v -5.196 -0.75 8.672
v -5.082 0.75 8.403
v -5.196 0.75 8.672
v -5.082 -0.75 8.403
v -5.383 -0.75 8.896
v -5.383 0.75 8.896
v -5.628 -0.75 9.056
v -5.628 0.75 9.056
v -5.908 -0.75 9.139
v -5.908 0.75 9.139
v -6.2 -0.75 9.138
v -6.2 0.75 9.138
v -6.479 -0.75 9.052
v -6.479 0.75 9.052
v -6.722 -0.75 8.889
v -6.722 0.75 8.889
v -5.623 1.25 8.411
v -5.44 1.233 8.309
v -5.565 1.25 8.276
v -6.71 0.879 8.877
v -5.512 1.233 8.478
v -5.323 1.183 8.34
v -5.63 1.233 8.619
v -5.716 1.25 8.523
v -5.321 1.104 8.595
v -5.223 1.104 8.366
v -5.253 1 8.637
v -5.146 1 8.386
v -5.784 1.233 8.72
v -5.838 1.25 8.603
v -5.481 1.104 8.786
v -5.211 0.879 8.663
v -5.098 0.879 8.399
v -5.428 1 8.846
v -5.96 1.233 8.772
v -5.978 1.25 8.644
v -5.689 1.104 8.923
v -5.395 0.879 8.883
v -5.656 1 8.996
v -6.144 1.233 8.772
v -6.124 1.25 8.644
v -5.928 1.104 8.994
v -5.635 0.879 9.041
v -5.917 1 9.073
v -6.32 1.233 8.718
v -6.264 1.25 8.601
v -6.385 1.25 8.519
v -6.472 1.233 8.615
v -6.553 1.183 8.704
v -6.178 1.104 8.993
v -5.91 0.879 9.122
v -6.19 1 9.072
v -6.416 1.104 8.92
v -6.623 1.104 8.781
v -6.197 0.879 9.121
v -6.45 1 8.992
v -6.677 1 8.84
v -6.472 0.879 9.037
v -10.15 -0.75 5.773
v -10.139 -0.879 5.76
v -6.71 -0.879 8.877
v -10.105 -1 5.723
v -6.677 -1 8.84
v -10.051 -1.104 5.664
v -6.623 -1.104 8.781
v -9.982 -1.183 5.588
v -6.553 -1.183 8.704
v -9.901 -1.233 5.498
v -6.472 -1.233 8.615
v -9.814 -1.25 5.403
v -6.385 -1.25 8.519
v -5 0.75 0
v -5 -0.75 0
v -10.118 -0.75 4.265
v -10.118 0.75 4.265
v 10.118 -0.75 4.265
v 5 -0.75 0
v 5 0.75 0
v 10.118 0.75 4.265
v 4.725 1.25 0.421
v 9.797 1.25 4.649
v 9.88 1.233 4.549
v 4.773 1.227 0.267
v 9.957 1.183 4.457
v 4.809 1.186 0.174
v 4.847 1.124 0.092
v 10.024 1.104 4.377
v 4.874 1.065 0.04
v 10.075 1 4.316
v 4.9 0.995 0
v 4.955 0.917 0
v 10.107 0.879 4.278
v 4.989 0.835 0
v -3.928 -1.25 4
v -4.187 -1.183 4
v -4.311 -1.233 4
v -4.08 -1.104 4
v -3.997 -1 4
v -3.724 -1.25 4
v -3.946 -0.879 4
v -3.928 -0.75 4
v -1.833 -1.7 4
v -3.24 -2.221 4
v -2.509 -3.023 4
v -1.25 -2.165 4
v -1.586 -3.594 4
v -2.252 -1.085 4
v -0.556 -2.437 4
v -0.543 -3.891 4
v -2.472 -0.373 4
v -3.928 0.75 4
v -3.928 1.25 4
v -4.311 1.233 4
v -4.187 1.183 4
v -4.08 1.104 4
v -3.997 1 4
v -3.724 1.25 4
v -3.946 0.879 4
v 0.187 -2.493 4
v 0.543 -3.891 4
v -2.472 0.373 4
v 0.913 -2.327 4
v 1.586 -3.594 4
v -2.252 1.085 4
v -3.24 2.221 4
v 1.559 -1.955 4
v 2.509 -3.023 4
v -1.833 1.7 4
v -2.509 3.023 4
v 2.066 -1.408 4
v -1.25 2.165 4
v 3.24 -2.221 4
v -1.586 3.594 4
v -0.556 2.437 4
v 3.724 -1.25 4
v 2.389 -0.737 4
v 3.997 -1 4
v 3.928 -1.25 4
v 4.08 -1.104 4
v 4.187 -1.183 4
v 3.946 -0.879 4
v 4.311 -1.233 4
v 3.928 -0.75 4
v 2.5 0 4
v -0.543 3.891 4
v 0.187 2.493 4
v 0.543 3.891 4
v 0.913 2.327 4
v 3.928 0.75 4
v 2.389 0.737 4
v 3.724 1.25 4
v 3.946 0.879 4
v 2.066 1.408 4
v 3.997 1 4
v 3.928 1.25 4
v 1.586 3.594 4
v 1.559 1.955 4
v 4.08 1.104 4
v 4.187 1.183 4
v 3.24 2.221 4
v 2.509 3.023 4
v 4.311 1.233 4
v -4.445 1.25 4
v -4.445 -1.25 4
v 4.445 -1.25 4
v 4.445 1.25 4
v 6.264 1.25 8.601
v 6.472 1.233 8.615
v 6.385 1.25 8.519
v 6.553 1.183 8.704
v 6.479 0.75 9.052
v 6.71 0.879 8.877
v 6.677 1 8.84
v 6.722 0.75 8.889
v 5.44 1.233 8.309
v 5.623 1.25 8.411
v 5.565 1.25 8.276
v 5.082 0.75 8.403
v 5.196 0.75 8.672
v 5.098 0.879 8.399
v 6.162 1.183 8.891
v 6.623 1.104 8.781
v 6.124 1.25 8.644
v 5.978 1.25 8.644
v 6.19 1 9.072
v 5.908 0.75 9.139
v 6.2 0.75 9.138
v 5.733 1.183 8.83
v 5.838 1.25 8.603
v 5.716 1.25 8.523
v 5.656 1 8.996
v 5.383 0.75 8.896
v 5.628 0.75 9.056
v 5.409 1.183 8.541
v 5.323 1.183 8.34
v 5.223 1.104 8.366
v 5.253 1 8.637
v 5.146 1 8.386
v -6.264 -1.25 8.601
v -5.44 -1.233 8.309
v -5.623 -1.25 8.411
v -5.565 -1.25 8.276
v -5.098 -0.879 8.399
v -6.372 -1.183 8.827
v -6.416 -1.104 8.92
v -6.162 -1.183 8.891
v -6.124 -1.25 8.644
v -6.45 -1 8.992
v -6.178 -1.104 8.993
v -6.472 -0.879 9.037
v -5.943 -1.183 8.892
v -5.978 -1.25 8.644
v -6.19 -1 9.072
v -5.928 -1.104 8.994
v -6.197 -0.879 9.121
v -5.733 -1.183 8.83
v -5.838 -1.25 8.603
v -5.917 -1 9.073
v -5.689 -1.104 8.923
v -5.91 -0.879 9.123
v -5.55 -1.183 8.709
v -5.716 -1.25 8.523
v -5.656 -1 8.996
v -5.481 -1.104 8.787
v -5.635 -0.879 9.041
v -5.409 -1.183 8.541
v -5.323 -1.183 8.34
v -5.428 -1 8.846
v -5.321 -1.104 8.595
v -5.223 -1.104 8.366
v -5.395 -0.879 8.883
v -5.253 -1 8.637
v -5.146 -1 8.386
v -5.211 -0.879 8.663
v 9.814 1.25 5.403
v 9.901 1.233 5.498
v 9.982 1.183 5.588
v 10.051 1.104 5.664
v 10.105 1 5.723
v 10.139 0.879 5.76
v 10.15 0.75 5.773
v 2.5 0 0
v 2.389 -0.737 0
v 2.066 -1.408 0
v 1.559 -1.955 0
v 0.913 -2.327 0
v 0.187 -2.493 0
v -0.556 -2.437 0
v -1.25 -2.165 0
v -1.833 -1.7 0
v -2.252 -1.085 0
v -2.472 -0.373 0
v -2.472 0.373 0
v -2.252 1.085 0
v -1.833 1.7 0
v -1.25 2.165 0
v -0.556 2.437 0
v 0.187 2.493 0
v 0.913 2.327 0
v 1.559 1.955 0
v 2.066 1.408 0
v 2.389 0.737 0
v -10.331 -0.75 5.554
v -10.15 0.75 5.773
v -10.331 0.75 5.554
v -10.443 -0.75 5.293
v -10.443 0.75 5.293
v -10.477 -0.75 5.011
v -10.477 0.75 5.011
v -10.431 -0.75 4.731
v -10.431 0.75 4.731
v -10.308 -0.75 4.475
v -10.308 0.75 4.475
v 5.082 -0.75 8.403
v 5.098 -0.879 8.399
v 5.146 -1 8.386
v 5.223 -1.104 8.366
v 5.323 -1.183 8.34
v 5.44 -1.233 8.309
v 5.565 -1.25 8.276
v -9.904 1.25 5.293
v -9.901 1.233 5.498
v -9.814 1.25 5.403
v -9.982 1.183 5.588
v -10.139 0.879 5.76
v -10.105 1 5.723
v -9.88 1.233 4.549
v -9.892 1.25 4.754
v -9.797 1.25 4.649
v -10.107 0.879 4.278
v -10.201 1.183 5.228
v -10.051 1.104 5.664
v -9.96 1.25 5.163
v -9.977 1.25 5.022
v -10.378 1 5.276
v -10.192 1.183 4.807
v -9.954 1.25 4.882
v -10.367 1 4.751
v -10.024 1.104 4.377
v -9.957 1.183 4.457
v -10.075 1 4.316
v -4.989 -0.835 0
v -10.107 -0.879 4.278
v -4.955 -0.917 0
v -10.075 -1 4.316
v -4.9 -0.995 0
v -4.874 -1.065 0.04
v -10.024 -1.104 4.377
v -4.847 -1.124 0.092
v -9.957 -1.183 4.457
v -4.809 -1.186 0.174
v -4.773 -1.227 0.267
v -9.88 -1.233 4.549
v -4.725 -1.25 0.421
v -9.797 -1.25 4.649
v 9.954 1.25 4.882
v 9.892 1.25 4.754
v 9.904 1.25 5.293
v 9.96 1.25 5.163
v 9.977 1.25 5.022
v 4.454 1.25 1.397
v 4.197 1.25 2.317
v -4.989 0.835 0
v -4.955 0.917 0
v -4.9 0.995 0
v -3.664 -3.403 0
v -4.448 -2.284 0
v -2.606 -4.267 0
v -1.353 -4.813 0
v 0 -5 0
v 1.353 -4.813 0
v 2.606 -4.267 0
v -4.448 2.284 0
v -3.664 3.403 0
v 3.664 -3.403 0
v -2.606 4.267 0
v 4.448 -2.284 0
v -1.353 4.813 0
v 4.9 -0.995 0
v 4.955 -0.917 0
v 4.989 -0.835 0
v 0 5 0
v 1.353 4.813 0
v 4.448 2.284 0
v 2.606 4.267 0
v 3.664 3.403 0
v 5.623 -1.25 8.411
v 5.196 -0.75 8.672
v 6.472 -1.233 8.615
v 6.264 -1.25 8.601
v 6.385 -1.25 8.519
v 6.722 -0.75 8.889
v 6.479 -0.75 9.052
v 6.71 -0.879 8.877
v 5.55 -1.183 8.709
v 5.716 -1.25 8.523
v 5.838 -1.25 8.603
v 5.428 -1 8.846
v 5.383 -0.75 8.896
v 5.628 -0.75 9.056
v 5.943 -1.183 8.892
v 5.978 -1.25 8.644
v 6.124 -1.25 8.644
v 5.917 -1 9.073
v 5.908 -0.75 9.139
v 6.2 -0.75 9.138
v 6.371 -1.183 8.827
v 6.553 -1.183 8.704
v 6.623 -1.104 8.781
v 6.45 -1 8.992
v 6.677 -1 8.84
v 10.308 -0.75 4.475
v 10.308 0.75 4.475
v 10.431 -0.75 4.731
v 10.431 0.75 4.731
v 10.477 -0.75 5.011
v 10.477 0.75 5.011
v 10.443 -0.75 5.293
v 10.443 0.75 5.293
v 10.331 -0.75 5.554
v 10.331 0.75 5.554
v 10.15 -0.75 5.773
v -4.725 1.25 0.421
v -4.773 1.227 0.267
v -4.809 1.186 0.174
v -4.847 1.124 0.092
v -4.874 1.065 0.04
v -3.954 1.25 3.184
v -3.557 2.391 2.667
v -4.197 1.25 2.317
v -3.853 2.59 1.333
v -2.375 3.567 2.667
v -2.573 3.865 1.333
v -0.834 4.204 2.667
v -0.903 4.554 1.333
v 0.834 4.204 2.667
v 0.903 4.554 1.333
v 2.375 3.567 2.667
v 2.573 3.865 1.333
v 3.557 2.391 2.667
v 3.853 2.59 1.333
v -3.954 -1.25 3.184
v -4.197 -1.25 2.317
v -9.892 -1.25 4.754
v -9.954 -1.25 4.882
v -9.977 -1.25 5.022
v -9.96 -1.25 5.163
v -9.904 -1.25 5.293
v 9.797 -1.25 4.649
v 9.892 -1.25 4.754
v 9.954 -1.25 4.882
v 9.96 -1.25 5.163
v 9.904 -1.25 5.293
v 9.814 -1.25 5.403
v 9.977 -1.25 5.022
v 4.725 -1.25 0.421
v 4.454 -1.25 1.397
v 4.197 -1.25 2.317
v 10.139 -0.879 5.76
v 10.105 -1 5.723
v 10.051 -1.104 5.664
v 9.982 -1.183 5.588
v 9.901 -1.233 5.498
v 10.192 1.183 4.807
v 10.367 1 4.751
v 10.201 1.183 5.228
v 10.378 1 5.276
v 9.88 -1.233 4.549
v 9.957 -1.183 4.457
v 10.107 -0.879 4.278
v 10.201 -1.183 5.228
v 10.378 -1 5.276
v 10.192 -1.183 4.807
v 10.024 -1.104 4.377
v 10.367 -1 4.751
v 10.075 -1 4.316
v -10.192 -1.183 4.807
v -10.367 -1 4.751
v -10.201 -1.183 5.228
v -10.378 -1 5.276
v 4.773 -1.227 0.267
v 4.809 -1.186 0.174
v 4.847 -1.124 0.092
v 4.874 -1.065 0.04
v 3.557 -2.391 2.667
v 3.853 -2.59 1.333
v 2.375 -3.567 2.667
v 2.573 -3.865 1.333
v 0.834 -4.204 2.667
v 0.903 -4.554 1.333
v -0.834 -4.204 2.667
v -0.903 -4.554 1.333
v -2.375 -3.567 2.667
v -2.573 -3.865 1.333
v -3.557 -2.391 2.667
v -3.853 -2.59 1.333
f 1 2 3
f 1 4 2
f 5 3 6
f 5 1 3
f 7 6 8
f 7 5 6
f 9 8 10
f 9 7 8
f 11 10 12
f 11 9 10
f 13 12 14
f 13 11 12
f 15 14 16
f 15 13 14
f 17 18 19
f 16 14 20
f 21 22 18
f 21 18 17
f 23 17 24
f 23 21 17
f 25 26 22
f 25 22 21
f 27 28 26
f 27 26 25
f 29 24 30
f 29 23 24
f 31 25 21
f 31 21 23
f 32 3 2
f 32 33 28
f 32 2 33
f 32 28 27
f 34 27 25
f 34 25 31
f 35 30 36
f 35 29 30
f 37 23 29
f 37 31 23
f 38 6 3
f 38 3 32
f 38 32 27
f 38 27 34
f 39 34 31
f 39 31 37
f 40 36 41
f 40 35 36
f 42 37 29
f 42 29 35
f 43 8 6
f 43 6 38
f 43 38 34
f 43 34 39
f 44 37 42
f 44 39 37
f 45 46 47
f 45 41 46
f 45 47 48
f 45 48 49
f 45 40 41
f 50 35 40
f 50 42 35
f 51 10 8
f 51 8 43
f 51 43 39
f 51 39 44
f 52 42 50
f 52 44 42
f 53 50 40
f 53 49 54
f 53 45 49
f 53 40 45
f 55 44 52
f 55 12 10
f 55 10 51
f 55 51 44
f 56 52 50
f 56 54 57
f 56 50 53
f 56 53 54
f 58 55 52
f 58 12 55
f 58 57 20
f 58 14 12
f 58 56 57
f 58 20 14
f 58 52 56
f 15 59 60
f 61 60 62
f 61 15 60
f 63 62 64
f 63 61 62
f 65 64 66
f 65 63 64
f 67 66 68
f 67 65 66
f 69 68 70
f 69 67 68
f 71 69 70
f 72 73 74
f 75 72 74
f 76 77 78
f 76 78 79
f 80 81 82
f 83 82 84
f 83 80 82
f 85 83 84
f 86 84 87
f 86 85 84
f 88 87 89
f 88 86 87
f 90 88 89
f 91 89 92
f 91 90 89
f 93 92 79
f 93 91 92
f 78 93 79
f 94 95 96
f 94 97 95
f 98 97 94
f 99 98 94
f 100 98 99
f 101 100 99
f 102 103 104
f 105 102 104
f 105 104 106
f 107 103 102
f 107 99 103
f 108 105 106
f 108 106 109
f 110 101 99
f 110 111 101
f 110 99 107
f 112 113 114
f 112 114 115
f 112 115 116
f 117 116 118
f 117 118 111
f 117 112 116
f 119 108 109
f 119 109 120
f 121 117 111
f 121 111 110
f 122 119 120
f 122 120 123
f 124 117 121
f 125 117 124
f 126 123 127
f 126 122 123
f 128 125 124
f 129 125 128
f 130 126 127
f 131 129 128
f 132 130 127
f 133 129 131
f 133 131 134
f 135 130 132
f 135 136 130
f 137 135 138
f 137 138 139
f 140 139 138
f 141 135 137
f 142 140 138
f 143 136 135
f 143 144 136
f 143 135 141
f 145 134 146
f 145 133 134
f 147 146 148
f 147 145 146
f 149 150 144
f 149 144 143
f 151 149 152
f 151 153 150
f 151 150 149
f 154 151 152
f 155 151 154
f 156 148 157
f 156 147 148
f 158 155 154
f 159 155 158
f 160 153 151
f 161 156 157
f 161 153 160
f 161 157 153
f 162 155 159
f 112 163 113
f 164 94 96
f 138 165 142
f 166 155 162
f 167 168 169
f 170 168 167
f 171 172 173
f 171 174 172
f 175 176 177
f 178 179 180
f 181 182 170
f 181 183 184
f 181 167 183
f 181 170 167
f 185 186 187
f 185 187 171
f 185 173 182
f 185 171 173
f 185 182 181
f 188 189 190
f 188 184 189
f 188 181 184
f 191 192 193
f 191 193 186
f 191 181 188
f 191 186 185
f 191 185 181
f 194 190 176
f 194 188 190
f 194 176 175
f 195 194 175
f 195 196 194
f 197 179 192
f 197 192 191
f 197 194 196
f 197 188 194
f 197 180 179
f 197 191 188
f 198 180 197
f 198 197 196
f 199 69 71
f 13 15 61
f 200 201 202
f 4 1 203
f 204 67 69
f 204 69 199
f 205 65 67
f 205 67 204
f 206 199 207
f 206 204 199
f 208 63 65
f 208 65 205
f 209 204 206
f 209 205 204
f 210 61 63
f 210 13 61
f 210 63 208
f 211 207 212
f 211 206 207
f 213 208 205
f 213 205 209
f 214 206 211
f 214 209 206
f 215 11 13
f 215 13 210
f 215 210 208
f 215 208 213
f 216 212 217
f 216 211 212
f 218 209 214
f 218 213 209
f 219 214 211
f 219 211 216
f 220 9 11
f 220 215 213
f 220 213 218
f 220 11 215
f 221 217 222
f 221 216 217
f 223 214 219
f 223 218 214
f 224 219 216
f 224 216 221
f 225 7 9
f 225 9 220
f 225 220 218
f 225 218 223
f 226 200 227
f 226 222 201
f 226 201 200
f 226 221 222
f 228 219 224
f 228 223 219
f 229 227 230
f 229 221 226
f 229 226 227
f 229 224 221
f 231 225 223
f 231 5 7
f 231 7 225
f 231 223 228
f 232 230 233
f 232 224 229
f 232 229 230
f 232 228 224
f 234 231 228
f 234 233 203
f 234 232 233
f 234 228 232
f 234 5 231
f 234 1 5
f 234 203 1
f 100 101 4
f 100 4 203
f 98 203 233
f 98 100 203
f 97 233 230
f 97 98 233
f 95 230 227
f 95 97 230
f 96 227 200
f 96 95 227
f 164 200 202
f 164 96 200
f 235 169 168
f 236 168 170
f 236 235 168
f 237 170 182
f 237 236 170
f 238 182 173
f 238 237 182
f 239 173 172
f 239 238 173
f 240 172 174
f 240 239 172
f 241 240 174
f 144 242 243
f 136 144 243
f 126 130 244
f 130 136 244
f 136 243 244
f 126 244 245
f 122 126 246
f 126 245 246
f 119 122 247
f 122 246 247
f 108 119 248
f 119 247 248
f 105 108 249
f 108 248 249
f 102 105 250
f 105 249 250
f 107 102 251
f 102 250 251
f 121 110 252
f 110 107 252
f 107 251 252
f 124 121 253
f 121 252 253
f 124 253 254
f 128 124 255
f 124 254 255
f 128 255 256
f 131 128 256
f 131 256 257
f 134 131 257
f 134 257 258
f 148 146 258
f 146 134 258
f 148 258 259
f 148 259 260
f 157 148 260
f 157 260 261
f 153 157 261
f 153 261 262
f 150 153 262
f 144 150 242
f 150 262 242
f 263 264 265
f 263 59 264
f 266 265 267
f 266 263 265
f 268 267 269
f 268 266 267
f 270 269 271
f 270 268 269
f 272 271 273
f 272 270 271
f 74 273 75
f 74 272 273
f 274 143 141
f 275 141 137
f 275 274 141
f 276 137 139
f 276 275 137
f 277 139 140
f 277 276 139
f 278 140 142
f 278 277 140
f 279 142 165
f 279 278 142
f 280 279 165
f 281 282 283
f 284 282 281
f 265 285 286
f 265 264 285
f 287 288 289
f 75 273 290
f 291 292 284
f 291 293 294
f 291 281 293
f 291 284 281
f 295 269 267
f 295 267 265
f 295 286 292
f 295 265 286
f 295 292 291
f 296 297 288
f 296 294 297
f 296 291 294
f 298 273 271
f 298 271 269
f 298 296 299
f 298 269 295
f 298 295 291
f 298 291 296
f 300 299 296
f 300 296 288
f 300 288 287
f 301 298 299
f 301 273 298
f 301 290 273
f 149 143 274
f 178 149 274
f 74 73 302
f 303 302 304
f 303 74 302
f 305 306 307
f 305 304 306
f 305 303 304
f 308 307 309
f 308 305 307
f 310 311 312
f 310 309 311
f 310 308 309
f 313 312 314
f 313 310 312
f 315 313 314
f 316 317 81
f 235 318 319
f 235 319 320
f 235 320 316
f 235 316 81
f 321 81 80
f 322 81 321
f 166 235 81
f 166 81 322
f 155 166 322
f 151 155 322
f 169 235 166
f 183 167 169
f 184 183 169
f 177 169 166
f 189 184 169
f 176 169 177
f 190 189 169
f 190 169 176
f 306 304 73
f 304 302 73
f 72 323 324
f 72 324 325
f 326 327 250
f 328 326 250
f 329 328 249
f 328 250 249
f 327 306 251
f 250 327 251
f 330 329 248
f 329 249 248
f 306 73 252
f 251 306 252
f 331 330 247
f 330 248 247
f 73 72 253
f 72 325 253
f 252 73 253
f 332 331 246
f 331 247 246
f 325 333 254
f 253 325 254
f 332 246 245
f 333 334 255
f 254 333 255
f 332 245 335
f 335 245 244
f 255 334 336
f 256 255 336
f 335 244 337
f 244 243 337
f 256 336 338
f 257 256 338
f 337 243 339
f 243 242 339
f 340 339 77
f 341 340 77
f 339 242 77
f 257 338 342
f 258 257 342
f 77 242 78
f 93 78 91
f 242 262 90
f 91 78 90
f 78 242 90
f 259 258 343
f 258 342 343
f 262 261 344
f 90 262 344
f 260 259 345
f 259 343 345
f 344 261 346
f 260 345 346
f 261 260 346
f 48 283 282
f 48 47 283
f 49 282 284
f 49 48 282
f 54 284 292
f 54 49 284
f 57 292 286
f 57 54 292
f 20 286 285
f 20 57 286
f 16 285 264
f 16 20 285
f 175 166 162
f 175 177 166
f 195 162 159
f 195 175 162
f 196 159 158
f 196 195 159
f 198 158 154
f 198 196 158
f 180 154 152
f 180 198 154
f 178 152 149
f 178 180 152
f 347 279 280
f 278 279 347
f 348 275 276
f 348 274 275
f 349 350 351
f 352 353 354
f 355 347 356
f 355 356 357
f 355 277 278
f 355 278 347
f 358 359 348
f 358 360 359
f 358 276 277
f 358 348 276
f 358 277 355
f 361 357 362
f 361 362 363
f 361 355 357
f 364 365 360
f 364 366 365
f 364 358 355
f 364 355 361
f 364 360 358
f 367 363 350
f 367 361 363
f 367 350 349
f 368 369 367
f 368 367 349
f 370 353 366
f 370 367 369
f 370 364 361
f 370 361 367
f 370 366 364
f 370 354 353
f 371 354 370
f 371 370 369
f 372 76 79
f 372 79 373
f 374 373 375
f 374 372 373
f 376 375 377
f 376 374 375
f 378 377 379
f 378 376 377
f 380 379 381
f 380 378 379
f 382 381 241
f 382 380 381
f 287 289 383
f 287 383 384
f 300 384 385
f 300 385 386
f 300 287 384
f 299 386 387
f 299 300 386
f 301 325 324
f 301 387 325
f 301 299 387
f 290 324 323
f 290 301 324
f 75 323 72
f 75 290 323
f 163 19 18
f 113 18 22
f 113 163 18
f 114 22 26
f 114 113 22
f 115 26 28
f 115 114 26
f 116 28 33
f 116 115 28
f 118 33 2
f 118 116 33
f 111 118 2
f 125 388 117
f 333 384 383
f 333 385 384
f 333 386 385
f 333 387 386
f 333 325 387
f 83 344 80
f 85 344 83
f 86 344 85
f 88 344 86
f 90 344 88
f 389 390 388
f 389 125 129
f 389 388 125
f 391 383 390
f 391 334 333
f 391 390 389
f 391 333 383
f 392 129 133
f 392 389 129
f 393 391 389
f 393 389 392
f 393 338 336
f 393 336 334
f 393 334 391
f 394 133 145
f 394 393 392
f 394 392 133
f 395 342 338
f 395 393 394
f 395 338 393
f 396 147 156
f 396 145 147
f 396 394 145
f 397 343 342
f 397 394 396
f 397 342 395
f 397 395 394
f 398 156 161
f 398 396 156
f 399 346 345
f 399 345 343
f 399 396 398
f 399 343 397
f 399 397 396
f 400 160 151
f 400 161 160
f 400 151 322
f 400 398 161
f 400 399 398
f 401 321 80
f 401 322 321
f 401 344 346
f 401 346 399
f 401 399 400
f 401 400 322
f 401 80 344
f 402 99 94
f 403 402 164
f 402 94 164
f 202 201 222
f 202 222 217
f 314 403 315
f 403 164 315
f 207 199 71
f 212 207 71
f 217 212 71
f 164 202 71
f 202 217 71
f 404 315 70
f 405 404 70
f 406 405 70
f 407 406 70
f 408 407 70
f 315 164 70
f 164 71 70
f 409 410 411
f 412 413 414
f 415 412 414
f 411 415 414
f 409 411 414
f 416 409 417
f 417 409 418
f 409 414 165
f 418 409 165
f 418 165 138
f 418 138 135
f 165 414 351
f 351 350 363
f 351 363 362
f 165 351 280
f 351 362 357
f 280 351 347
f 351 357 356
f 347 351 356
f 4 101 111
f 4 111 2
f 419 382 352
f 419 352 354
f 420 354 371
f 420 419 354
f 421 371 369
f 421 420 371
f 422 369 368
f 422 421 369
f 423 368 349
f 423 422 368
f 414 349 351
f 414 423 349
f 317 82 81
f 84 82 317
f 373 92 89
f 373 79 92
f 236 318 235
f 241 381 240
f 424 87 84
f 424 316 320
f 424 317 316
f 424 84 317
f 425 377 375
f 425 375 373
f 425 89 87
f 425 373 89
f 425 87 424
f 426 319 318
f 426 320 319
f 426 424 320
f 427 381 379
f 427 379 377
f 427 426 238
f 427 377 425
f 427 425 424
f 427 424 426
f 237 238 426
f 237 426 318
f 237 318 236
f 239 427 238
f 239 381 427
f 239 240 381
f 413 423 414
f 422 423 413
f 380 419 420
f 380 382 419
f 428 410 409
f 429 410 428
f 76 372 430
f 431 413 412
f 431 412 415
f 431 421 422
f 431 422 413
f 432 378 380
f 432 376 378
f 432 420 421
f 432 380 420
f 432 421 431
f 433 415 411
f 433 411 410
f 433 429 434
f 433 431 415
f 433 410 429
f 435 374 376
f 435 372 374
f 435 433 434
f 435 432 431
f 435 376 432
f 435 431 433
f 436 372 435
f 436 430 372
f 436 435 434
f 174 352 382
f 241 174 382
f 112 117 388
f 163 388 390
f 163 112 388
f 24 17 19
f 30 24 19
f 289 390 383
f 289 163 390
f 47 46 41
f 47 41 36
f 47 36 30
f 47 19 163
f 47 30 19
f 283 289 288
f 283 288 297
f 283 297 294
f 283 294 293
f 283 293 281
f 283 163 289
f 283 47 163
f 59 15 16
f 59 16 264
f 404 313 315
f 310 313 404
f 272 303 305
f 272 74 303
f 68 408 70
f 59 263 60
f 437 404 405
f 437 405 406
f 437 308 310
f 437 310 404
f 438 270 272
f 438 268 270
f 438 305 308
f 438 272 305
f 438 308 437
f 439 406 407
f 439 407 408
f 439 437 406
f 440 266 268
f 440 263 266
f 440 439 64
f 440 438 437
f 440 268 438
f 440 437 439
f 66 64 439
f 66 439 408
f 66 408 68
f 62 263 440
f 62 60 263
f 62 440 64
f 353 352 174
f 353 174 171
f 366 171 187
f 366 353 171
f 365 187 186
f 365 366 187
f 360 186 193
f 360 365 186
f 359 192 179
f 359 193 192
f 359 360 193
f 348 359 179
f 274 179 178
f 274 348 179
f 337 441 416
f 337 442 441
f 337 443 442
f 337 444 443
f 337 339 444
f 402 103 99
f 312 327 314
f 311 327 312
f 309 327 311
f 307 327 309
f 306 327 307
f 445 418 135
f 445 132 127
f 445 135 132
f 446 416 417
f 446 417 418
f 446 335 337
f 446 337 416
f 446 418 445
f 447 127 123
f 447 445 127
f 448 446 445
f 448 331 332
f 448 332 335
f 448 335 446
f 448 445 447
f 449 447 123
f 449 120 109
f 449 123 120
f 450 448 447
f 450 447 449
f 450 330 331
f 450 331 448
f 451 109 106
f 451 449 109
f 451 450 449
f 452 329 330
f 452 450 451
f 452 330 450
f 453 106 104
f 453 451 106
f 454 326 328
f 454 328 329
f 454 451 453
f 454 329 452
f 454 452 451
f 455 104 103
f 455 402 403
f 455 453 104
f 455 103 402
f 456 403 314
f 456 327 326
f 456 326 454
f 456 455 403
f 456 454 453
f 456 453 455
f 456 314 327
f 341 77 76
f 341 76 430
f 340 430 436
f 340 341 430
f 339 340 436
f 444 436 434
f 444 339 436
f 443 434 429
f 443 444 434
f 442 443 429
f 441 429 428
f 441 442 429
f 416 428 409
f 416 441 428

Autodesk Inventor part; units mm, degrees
ref_plane "YZ Plane" through (0, 0, 0) normal (1, 0, 0) x (0, 1, 0)
ref_plane "XZ Plane" through (0, 0, 0) normal (0, 1, 0) x (-1, 0, 0)
ref_plane "XY Plane" through (0, 0, 0) normal (0, 0, 1) x (1, 0, 0)
sketch "Эскиз1" plane through (0, 0, 0) normal (0, 1, 0) x (-1, 0, 0)
  line L0 (-2.5, 4) -> (-2.5, 0)
  line L1 (-5, 0) -> (-2.5, 0)
  line L2 (-5, 0) -> (-3.9282, 4)
  line L3 (-2.5, 4) -> (-3.9282, 4)
  line L4 (0, 0) -> (0, 7.6417) construction
revolve "Вращение1" add sketch "Эскиз1" angle 360 about axis through (0, 0, 0) along (0, 0, 1)
sketch "Эскиз2" plane through (0, 0, 0) normal (0, 1, 0) x (-1, 0, 0)
  line L0 (-6.7216, 8.8894) -> (-10.15, 5.7727)
  line L1 (-5, 0) -> (-10.1175, 4.2646)
  line L2 (-3.9282, 4) -> (-5.0816, 8.4029)
  arc A0 (-5.0816, 8.4029) -> (-6.7216, 8.8894) centre (-6.049, 8.1495) ccw
  arc A1 (-10.15, 5.7727) -> (-10.1175, 4.2646) centre (-9.4773, 5.0328) ccw
  line L3 (0, 0) -> (0, 6.5882) construction
  line L4 (6.7216, 8.8894) -> (10.15, 5.7727)
  line L5 (5, 0) -> (10.1175, 4.2646)
  line L6 (3.9282, 4) -> (5.0816, 8.4029)
  arc A2 (6.7216, 8.8894) -> (5.0816, 8.4029) centre (6.049, 8.1495) ccw
  arc A3 (10.1175, 4.2646) -> (10.15, 5.7727) centre (9.4773, 5.0328) ccw
  line L7 (-3.9282, 4) -> (-3.4282, 4)
  line L8 (-3.4282, 4) -> (-4.5049, 0)
  line L9 (-4.5049, 0) -> (-5, 0)
  line L10 (3.9282, 4) -> (3.4282, 4)
  line L11 (3.4282, 4) -> (4.5049, 0)
  line L12 (4.5049, 0) -> (5, 0)
extrude "Выдавливание1" add sketch "Эскиз2" along normal mid plane 2.5
fillet "Сопряжение1" radius 0.5 20 edges at (5.7646, -1.25, 9.1082) (8.4358, -1.25, 7.3311) (10.4771, -1.25, 5.0113) (7.5587, -1.25, 2.1323) (4.5049, -1.25, 6.2014) (10.4771, 1.25, 5.0113) (7.5587, 1.25, 2.1323) (5.7646, 1.25, 9.1082) (4.5049, 1.25, 6.2014) (8.4358, 1.25, 7.3311) (-5.7646, -1.25, 9.1082) (-8.4358, -1.25, 7.3311) (-10.4771, -1.25, 5.0113) (-7.5587, -1.25, 2.1323) (-4.5049, -1.25, 6.2014) (-5.7646, 1.25, 9.1082) (-8.4358, 1.25, 7.3311) (-10.4771, 1.25, 5.0113) (-7.5587, 1.25, 2.1323) (-4.5049, 1.25, 6.2014)
thread "Резьба1" size "M5x0.8" class "6H" standard "ANSI Metric M Profile" full length
properties part number "Гайка-барашек М5"
